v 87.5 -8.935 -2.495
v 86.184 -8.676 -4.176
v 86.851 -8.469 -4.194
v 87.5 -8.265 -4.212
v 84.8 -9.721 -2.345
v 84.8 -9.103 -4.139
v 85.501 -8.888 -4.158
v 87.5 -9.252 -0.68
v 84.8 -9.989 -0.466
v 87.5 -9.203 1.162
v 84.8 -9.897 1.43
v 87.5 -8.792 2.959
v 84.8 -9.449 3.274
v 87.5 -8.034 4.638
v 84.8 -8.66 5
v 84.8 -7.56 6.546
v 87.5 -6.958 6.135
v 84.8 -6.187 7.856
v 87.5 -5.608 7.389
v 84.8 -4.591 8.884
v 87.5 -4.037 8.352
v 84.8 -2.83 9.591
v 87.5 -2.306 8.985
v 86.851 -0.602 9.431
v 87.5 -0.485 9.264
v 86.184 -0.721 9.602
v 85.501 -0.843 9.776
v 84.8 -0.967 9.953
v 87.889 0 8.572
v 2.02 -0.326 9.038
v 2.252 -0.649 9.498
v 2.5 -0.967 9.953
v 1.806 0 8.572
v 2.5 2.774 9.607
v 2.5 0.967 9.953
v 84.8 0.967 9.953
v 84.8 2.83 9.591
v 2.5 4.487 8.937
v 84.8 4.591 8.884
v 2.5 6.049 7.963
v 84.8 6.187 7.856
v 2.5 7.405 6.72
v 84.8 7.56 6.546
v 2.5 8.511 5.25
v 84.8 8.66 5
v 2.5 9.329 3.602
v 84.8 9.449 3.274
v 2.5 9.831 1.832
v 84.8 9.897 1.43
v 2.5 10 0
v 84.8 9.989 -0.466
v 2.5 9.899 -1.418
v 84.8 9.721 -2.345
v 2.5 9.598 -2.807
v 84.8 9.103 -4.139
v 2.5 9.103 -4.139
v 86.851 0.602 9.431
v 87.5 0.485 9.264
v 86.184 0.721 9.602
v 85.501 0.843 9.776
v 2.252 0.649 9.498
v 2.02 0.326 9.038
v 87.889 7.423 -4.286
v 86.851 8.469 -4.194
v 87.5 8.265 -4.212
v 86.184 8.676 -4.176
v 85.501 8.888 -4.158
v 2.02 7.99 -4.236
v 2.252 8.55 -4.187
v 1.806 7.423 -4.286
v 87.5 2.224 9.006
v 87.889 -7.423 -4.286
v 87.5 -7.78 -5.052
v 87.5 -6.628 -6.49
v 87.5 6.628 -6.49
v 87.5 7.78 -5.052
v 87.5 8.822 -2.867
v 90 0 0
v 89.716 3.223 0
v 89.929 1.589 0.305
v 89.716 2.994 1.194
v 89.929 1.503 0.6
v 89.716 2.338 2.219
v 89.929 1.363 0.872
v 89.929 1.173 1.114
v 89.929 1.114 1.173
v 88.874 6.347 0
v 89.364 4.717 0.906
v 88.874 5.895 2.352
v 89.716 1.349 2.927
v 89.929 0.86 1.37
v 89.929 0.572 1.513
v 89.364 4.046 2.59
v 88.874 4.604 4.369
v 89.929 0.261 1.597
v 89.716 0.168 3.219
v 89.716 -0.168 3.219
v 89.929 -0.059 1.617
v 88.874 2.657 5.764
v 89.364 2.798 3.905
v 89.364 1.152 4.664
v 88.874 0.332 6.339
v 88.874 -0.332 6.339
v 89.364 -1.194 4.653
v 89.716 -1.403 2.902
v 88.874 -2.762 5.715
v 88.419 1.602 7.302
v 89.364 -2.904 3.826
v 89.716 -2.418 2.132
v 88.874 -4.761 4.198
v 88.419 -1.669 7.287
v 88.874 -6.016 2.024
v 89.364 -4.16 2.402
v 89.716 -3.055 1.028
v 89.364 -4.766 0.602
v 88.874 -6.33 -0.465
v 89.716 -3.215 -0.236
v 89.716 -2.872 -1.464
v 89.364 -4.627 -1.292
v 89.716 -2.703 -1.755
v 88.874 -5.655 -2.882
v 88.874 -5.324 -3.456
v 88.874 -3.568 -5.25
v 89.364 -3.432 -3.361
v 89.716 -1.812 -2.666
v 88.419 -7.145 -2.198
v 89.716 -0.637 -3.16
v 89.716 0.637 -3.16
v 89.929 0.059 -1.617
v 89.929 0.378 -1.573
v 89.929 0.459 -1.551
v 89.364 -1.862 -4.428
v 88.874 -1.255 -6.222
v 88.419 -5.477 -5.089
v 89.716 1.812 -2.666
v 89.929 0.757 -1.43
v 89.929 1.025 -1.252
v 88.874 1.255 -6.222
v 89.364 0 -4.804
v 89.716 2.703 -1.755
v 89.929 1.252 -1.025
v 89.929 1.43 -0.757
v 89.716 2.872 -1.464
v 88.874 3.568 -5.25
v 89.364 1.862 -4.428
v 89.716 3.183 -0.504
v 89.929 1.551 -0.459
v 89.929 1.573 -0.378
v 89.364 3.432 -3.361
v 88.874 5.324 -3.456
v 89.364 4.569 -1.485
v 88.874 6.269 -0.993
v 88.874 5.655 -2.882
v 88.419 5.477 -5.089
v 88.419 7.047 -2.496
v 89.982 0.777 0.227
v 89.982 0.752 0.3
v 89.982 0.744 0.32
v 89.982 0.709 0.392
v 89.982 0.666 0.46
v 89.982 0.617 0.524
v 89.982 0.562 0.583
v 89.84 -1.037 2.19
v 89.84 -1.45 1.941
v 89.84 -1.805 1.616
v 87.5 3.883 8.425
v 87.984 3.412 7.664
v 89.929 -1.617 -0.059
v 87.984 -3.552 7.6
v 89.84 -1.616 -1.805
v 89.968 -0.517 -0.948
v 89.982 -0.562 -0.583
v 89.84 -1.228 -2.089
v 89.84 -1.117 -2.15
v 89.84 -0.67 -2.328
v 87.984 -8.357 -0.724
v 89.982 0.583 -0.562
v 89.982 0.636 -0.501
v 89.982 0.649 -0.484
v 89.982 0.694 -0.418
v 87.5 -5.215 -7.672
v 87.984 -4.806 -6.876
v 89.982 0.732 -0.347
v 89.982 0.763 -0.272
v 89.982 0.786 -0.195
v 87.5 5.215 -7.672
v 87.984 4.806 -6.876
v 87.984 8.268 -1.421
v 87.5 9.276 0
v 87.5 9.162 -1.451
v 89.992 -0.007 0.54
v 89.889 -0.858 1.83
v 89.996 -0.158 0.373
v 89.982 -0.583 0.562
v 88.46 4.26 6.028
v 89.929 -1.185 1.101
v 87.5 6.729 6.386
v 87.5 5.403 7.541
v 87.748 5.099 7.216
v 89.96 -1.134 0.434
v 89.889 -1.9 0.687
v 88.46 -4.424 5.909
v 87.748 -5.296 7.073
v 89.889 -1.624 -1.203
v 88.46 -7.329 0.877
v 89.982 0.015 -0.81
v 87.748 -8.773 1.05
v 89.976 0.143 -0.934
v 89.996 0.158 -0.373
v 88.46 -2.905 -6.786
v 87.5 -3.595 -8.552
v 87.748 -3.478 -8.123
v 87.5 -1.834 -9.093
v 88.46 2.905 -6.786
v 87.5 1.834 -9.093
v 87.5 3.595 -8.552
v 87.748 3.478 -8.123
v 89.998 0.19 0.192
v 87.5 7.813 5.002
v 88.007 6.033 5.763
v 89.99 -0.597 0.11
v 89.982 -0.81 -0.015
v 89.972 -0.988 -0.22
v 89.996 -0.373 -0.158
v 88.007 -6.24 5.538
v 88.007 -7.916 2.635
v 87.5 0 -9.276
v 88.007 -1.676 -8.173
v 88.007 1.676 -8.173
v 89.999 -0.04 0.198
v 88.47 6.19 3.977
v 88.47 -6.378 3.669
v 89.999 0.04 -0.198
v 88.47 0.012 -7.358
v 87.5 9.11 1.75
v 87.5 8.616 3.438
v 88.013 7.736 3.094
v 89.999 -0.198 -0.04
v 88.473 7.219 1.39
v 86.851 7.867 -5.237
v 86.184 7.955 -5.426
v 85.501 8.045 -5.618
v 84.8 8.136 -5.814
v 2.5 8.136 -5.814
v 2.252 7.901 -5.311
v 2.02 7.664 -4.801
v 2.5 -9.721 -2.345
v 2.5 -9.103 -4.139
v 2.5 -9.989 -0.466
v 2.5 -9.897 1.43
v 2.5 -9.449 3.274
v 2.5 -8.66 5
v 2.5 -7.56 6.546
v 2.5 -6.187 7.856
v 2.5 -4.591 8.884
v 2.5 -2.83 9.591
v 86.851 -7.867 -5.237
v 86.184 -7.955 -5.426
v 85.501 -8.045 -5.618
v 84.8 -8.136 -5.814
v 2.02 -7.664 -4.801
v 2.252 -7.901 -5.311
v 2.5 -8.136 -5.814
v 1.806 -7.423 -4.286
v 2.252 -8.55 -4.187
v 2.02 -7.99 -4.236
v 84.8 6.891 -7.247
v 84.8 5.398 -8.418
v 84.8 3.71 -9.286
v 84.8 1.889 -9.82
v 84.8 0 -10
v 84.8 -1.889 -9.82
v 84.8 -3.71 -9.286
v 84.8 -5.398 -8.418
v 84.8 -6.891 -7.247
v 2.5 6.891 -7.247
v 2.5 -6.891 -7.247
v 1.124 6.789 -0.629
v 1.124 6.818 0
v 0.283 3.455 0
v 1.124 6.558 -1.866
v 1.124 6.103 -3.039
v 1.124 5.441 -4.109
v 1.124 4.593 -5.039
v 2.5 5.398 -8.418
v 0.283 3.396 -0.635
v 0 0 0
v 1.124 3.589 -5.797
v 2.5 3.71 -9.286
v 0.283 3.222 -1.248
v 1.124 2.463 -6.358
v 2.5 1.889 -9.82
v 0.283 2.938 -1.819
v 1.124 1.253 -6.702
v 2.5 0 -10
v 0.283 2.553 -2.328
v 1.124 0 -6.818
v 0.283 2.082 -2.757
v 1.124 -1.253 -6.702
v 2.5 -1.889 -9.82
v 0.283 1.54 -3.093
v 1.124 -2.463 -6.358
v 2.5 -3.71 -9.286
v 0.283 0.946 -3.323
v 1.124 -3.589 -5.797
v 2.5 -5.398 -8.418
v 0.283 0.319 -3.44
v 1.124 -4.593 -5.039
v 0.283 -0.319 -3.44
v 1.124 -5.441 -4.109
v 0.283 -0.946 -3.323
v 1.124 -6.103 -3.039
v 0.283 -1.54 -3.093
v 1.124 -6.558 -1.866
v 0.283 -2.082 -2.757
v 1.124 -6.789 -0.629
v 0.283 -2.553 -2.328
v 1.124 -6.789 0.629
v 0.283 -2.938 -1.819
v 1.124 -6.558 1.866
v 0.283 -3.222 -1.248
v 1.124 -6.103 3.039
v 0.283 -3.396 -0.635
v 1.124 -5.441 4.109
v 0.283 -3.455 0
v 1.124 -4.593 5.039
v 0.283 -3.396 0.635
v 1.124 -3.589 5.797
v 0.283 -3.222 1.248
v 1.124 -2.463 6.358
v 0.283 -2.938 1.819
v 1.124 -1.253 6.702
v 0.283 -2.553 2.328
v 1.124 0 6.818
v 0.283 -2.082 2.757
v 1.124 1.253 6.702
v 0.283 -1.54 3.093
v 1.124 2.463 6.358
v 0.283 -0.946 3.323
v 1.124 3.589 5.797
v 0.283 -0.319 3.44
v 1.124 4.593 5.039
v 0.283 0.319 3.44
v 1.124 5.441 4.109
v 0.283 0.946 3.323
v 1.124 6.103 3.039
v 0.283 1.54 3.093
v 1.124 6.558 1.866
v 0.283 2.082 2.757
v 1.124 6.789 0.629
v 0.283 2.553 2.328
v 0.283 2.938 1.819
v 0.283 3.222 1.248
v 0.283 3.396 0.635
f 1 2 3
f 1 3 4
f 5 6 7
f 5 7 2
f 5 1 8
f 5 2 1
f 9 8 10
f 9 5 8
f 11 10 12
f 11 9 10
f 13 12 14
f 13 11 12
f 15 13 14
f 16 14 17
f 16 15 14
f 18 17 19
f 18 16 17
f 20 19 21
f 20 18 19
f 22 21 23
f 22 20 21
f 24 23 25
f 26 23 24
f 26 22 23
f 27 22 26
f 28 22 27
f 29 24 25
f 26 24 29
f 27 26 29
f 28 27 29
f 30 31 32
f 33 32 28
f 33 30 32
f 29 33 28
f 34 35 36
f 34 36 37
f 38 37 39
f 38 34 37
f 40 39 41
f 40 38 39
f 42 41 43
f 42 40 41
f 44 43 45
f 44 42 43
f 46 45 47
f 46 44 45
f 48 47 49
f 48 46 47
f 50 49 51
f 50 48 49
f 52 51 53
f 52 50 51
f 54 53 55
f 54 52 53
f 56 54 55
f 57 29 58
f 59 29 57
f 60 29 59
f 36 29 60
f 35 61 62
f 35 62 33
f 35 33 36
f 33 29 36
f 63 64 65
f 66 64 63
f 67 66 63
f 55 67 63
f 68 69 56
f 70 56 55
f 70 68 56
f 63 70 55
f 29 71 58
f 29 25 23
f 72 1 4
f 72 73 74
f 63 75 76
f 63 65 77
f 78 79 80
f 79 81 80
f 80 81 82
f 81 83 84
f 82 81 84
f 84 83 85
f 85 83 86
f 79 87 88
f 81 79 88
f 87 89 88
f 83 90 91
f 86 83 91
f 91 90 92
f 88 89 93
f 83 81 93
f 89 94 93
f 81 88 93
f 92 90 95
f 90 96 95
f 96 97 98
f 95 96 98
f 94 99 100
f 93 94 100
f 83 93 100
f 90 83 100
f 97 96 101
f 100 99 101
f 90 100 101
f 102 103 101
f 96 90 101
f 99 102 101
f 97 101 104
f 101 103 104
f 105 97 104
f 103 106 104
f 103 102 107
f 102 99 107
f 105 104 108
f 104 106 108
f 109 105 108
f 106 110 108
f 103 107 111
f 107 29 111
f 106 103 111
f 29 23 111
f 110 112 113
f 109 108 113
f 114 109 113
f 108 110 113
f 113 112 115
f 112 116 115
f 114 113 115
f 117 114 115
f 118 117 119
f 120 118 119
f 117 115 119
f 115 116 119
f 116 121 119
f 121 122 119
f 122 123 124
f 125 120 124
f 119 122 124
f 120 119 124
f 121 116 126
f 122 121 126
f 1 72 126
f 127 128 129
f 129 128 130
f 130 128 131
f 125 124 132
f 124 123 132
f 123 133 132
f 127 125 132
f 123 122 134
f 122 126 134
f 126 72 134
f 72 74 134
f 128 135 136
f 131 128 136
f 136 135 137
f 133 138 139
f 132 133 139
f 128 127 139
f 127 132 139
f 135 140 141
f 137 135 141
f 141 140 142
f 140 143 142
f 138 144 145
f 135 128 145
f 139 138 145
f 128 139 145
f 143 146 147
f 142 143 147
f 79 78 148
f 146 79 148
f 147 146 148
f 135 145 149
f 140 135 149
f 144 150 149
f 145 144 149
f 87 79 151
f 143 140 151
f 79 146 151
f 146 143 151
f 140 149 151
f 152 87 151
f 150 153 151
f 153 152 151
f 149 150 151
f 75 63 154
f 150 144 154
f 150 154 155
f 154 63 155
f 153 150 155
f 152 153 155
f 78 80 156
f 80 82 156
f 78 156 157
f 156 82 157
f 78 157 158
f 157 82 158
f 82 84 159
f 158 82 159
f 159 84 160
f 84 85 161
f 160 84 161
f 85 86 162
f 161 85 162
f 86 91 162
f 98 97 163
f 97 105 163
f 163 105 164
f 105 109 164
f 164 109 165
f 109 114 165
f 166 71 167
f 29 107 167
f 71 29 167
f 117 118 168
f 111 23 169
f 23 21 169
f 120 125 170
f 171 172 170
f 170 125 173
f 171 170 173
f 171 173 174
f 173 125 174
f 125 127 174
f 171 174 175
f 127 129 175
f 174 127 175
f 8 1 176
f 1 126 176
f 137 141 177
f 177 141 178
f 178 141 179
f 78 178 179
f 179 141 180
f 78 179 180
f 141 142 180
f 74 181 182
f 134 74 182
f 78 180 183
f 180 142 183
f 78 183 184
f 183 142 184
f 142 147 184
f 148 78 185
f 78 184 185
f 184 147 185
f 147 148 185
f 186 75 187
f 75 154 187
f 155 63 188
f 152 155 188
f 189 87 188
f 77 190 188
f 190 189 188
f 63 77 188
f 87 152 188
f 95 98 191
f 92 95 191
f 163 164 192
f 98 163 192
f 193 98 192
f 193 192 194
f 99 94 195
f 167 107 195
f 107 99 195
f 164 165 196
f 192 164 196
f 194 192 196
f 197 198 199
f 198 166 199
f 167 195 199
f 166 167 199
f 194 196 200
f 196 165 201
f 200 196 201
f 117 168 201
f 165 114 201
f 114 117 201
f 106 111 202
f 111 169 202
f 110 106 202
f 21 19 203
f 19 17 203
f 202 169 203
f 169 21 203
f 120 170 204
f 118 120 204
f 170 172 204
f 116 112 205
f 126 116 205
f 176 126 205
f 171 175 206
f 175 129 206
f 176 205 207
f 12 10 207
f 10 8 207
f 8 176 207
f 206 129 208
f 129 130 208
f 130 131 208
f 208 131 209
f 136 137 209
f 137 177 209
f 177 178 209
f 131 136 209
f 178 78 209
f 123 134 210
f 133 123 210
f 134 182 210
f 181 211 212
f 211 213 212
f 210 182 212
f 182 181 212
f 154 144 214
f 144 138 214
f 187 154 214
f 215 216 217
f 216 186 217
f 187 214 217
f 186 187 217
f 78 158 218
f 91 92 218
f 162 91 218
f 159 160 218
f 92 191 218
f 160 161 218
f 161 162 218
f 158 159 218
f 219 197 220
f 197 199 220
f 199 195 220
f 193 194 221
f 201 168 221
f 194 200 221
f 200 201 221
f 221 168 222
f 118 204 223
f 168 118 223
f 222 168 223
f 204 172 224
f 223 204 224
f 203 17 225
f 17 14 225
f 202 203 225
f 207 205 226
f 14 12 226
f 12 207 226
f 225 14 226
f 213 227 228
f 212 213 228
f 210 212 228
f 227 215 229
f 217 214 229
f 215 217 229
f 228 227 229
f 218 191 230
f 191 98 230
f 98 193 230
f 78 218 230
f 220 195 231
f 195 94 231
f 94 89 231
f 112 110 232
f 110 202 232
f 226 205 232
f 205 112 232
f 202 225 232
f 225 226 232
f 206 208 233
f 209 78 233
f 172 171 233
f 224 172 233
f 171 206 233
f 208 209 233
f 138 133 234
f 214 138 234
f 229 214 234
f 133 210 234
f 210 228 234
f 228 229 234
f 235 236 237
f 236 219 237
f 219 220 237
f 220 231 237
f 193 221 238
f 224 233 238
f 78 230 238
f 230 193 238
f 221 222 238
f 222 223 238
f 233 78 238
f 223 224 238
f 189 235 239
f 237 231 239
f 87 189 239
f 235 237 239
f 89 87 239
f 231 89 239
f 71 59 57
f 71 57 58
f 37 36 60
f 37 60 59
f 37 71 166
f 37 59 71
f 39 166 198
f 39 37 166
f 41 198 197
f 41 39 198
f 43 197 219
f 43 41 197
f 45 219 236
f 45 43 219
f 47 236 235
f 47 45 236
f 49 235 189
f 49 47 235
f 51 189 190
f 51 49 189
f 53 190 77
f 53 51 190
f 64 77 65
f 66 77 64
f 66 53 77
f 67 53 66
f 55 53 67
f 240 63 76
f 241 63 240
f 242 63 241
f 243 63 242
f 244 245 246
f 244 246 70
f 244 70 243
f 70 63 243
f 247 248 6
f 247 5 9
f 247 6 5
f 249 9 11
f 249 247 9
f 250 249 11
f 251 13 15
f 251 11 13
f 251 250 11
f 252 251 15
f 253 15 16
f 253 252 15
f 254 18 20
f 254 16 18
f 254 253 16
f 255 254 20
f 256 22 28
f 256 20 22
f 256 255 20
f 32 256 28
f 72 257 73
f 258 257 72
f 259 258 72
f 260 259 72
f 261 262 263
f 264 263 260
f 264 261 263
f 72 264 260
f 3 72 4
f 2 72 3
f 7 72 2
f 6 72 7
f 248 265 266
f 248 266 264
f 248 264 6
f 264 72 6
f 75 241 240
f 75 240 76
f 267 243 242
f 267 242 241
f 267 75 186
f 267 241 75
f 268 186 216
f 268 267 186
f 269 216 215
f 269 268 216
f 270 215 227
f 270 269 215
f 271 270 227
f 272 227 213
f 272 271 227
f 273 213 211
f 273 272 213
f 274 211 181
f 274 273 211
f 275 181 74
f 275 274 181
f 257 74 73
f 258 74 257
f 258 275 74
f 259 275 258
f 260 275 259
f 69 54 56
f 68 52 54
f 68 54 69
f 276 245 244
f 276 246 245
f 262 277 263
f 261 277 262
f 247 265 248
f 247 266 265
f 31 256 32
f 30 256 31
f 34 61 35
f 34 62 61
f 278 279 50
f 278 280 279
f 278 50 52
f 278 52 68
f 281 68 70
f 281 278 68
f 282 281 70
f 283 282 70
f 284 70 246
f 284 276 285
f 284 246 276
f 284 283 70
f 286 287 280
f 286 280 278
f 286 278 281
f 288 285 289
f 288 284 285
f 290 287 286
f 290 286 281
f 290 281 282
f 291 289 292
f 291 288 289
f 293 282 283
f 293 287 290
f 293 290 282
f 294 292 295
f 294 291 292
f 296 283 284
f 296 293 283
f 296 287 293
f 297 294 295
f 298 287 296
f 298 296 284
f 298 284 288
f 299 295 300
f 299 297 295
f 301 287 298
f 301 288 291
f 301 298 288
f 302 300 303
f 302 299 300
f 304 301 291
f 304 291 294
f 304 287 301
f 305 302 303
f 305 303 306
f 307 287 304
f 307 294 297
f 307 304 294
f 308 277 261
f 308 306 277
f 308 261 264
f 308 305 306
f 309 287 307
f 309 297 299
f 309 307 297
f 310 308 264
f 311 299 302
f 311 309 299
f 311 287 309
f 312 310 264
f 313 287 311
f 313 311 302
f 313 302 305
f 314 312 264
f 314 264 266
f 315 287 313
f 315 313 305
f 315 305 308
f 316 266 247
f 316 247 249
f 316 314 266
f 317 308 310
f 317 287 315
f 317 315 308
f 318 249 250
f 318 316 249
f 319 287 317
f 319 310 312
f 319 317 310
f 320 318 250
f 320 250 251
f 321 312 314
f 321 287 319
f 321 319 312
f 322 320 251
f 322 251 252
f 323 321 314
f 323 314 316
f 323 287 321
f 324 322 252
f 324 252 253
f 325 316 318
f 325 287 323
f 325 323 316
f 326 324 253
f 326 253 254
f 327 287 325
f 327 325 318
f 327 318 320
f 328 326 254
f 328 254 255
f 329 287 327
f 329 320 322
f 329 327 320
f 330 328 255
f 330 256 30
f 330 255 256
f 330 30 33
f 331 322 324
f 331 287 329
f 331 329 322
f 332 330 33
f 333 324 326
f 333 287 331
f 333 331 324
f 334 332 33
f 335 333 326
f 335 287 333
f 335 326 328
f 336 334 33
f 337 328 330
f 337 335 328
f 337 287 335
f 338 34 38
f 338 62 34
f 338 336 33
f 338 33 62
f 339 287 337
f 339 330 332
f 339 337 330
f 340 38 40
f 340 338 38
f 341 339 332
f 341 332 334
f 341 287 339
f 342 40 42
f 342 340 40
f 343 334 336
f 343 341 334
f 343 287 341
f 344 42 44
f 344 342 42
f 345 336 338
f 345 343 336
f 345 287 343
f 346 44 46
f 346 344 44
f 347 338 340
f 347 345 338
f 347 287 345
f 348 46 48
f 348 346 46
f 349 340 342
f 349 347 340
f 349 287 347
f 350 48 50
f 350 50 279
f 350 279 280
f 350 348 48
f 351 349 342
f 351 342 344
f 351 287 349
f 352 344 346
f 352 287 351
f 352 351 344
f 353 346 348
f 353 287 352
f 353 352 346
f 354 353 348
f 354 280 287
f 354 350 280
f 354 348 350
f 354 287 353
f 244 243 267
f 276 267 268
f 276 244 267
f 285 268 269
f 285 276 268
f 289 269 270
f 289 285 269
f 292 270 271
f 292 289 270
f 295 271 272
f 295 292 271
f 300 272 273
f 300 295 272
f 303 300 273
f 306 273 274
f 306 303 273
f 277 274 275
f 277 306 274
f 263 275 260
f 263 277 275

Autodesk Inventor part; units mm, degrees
ref_plane "YZ Plane" through (0, 0, 0) normal (1, 0, 0) x (0, 1, 0)
ref_plane "XZ Plane" through (0, 0, 0) normal (0, 1, 0) x (-1, 0, 0)
ref_plane "XY Plane" through (0, 0, 0) normal (0, 0, 1) x (1, 0, 0)
sketch "Sketch1" plane through (0, 0, 0) normal (0, 0, 1) x (1, 0, 0)
  line L0 (87.5, 9.2765) -> (84.8, 10)
  line L1 (84.8, 10) -> (2.5, 10)
  line L2 (0, 0) -> (90, 0)
  arc A0 (90, 0) -> (87.5, 9.2765) centre (71.5392, 0) ccw
  arc A1 (2.5, 10) -> (0, 0) centre (21.25, 0) ccw
  dimension "d0" = 90
  dimension "d1" = 20
  dimension "d2" = 5.2
  dimension "d3" = 15
  dimension "d4" = 2.5
  dimension "d5" = 2.5
revolve "Body" add sketch "Sketch1" angle 360 about axis through (0, 0, 0) along (1, 0, 0)
sketch "Sketch2" plane through (0, 0, 0) normal (1, 0, 0) x (0, 1, 0)
  circle A0 centre (0, 0) radius 10 projected
  line L0 (0, 10) -> (-1, 10)
  line L1 (0, 10) -> (1, 10)
  line L2 (-1, 10) -> (0, 8.5719)
  line L3 (0, 8.5719) -> (1, 10)
  line L4 (0, -14) -> (0, 14) projected
  dimension "d6" = 35
  dimension "d7" = 35
  dimension "d8" = 1
extrude "Groove" cut sketch "Sketch2" along normal through all contours L3 L4 A0 | A0 L1 L3 | L4 L2 A0 | A0 L2 L0 picked at (0.5375, 9.5014) picked at (-0.5375, 9.5014)
pattern_circular "Grooves" count 3 over 360 about axis through (-10, 0, 0) along (1, 0, 0) of "Groove"
equation "\"d0\" = NLG"
equation "\"d1\" = NND"
equation "\"d2\" = PHH"
equation "\"d3\" = FAWI"
equation "\"d4\" = KAH"
equation "\"d5\" = KAH"
equation "\"d8\" = 0.05 * NND"
equation "\"NND\" = 20"
equation "\"NLG\" = 90"
equation "\"PHH\" = 5.2"
equation "\"FAWI\" = 15deg"
equation "\"KAH\" = 2.5"
equation "\"d13\" = -KAH"
equation "\"d28\" = KAH"
equation "\"NND1\" = 20.5"
equation "\"KAH1\" = 1.82"
equation "\"NLG1\" = 88.18"
properties part number "CNS 9215 - 20 x 90" material "Steel, Mild"
